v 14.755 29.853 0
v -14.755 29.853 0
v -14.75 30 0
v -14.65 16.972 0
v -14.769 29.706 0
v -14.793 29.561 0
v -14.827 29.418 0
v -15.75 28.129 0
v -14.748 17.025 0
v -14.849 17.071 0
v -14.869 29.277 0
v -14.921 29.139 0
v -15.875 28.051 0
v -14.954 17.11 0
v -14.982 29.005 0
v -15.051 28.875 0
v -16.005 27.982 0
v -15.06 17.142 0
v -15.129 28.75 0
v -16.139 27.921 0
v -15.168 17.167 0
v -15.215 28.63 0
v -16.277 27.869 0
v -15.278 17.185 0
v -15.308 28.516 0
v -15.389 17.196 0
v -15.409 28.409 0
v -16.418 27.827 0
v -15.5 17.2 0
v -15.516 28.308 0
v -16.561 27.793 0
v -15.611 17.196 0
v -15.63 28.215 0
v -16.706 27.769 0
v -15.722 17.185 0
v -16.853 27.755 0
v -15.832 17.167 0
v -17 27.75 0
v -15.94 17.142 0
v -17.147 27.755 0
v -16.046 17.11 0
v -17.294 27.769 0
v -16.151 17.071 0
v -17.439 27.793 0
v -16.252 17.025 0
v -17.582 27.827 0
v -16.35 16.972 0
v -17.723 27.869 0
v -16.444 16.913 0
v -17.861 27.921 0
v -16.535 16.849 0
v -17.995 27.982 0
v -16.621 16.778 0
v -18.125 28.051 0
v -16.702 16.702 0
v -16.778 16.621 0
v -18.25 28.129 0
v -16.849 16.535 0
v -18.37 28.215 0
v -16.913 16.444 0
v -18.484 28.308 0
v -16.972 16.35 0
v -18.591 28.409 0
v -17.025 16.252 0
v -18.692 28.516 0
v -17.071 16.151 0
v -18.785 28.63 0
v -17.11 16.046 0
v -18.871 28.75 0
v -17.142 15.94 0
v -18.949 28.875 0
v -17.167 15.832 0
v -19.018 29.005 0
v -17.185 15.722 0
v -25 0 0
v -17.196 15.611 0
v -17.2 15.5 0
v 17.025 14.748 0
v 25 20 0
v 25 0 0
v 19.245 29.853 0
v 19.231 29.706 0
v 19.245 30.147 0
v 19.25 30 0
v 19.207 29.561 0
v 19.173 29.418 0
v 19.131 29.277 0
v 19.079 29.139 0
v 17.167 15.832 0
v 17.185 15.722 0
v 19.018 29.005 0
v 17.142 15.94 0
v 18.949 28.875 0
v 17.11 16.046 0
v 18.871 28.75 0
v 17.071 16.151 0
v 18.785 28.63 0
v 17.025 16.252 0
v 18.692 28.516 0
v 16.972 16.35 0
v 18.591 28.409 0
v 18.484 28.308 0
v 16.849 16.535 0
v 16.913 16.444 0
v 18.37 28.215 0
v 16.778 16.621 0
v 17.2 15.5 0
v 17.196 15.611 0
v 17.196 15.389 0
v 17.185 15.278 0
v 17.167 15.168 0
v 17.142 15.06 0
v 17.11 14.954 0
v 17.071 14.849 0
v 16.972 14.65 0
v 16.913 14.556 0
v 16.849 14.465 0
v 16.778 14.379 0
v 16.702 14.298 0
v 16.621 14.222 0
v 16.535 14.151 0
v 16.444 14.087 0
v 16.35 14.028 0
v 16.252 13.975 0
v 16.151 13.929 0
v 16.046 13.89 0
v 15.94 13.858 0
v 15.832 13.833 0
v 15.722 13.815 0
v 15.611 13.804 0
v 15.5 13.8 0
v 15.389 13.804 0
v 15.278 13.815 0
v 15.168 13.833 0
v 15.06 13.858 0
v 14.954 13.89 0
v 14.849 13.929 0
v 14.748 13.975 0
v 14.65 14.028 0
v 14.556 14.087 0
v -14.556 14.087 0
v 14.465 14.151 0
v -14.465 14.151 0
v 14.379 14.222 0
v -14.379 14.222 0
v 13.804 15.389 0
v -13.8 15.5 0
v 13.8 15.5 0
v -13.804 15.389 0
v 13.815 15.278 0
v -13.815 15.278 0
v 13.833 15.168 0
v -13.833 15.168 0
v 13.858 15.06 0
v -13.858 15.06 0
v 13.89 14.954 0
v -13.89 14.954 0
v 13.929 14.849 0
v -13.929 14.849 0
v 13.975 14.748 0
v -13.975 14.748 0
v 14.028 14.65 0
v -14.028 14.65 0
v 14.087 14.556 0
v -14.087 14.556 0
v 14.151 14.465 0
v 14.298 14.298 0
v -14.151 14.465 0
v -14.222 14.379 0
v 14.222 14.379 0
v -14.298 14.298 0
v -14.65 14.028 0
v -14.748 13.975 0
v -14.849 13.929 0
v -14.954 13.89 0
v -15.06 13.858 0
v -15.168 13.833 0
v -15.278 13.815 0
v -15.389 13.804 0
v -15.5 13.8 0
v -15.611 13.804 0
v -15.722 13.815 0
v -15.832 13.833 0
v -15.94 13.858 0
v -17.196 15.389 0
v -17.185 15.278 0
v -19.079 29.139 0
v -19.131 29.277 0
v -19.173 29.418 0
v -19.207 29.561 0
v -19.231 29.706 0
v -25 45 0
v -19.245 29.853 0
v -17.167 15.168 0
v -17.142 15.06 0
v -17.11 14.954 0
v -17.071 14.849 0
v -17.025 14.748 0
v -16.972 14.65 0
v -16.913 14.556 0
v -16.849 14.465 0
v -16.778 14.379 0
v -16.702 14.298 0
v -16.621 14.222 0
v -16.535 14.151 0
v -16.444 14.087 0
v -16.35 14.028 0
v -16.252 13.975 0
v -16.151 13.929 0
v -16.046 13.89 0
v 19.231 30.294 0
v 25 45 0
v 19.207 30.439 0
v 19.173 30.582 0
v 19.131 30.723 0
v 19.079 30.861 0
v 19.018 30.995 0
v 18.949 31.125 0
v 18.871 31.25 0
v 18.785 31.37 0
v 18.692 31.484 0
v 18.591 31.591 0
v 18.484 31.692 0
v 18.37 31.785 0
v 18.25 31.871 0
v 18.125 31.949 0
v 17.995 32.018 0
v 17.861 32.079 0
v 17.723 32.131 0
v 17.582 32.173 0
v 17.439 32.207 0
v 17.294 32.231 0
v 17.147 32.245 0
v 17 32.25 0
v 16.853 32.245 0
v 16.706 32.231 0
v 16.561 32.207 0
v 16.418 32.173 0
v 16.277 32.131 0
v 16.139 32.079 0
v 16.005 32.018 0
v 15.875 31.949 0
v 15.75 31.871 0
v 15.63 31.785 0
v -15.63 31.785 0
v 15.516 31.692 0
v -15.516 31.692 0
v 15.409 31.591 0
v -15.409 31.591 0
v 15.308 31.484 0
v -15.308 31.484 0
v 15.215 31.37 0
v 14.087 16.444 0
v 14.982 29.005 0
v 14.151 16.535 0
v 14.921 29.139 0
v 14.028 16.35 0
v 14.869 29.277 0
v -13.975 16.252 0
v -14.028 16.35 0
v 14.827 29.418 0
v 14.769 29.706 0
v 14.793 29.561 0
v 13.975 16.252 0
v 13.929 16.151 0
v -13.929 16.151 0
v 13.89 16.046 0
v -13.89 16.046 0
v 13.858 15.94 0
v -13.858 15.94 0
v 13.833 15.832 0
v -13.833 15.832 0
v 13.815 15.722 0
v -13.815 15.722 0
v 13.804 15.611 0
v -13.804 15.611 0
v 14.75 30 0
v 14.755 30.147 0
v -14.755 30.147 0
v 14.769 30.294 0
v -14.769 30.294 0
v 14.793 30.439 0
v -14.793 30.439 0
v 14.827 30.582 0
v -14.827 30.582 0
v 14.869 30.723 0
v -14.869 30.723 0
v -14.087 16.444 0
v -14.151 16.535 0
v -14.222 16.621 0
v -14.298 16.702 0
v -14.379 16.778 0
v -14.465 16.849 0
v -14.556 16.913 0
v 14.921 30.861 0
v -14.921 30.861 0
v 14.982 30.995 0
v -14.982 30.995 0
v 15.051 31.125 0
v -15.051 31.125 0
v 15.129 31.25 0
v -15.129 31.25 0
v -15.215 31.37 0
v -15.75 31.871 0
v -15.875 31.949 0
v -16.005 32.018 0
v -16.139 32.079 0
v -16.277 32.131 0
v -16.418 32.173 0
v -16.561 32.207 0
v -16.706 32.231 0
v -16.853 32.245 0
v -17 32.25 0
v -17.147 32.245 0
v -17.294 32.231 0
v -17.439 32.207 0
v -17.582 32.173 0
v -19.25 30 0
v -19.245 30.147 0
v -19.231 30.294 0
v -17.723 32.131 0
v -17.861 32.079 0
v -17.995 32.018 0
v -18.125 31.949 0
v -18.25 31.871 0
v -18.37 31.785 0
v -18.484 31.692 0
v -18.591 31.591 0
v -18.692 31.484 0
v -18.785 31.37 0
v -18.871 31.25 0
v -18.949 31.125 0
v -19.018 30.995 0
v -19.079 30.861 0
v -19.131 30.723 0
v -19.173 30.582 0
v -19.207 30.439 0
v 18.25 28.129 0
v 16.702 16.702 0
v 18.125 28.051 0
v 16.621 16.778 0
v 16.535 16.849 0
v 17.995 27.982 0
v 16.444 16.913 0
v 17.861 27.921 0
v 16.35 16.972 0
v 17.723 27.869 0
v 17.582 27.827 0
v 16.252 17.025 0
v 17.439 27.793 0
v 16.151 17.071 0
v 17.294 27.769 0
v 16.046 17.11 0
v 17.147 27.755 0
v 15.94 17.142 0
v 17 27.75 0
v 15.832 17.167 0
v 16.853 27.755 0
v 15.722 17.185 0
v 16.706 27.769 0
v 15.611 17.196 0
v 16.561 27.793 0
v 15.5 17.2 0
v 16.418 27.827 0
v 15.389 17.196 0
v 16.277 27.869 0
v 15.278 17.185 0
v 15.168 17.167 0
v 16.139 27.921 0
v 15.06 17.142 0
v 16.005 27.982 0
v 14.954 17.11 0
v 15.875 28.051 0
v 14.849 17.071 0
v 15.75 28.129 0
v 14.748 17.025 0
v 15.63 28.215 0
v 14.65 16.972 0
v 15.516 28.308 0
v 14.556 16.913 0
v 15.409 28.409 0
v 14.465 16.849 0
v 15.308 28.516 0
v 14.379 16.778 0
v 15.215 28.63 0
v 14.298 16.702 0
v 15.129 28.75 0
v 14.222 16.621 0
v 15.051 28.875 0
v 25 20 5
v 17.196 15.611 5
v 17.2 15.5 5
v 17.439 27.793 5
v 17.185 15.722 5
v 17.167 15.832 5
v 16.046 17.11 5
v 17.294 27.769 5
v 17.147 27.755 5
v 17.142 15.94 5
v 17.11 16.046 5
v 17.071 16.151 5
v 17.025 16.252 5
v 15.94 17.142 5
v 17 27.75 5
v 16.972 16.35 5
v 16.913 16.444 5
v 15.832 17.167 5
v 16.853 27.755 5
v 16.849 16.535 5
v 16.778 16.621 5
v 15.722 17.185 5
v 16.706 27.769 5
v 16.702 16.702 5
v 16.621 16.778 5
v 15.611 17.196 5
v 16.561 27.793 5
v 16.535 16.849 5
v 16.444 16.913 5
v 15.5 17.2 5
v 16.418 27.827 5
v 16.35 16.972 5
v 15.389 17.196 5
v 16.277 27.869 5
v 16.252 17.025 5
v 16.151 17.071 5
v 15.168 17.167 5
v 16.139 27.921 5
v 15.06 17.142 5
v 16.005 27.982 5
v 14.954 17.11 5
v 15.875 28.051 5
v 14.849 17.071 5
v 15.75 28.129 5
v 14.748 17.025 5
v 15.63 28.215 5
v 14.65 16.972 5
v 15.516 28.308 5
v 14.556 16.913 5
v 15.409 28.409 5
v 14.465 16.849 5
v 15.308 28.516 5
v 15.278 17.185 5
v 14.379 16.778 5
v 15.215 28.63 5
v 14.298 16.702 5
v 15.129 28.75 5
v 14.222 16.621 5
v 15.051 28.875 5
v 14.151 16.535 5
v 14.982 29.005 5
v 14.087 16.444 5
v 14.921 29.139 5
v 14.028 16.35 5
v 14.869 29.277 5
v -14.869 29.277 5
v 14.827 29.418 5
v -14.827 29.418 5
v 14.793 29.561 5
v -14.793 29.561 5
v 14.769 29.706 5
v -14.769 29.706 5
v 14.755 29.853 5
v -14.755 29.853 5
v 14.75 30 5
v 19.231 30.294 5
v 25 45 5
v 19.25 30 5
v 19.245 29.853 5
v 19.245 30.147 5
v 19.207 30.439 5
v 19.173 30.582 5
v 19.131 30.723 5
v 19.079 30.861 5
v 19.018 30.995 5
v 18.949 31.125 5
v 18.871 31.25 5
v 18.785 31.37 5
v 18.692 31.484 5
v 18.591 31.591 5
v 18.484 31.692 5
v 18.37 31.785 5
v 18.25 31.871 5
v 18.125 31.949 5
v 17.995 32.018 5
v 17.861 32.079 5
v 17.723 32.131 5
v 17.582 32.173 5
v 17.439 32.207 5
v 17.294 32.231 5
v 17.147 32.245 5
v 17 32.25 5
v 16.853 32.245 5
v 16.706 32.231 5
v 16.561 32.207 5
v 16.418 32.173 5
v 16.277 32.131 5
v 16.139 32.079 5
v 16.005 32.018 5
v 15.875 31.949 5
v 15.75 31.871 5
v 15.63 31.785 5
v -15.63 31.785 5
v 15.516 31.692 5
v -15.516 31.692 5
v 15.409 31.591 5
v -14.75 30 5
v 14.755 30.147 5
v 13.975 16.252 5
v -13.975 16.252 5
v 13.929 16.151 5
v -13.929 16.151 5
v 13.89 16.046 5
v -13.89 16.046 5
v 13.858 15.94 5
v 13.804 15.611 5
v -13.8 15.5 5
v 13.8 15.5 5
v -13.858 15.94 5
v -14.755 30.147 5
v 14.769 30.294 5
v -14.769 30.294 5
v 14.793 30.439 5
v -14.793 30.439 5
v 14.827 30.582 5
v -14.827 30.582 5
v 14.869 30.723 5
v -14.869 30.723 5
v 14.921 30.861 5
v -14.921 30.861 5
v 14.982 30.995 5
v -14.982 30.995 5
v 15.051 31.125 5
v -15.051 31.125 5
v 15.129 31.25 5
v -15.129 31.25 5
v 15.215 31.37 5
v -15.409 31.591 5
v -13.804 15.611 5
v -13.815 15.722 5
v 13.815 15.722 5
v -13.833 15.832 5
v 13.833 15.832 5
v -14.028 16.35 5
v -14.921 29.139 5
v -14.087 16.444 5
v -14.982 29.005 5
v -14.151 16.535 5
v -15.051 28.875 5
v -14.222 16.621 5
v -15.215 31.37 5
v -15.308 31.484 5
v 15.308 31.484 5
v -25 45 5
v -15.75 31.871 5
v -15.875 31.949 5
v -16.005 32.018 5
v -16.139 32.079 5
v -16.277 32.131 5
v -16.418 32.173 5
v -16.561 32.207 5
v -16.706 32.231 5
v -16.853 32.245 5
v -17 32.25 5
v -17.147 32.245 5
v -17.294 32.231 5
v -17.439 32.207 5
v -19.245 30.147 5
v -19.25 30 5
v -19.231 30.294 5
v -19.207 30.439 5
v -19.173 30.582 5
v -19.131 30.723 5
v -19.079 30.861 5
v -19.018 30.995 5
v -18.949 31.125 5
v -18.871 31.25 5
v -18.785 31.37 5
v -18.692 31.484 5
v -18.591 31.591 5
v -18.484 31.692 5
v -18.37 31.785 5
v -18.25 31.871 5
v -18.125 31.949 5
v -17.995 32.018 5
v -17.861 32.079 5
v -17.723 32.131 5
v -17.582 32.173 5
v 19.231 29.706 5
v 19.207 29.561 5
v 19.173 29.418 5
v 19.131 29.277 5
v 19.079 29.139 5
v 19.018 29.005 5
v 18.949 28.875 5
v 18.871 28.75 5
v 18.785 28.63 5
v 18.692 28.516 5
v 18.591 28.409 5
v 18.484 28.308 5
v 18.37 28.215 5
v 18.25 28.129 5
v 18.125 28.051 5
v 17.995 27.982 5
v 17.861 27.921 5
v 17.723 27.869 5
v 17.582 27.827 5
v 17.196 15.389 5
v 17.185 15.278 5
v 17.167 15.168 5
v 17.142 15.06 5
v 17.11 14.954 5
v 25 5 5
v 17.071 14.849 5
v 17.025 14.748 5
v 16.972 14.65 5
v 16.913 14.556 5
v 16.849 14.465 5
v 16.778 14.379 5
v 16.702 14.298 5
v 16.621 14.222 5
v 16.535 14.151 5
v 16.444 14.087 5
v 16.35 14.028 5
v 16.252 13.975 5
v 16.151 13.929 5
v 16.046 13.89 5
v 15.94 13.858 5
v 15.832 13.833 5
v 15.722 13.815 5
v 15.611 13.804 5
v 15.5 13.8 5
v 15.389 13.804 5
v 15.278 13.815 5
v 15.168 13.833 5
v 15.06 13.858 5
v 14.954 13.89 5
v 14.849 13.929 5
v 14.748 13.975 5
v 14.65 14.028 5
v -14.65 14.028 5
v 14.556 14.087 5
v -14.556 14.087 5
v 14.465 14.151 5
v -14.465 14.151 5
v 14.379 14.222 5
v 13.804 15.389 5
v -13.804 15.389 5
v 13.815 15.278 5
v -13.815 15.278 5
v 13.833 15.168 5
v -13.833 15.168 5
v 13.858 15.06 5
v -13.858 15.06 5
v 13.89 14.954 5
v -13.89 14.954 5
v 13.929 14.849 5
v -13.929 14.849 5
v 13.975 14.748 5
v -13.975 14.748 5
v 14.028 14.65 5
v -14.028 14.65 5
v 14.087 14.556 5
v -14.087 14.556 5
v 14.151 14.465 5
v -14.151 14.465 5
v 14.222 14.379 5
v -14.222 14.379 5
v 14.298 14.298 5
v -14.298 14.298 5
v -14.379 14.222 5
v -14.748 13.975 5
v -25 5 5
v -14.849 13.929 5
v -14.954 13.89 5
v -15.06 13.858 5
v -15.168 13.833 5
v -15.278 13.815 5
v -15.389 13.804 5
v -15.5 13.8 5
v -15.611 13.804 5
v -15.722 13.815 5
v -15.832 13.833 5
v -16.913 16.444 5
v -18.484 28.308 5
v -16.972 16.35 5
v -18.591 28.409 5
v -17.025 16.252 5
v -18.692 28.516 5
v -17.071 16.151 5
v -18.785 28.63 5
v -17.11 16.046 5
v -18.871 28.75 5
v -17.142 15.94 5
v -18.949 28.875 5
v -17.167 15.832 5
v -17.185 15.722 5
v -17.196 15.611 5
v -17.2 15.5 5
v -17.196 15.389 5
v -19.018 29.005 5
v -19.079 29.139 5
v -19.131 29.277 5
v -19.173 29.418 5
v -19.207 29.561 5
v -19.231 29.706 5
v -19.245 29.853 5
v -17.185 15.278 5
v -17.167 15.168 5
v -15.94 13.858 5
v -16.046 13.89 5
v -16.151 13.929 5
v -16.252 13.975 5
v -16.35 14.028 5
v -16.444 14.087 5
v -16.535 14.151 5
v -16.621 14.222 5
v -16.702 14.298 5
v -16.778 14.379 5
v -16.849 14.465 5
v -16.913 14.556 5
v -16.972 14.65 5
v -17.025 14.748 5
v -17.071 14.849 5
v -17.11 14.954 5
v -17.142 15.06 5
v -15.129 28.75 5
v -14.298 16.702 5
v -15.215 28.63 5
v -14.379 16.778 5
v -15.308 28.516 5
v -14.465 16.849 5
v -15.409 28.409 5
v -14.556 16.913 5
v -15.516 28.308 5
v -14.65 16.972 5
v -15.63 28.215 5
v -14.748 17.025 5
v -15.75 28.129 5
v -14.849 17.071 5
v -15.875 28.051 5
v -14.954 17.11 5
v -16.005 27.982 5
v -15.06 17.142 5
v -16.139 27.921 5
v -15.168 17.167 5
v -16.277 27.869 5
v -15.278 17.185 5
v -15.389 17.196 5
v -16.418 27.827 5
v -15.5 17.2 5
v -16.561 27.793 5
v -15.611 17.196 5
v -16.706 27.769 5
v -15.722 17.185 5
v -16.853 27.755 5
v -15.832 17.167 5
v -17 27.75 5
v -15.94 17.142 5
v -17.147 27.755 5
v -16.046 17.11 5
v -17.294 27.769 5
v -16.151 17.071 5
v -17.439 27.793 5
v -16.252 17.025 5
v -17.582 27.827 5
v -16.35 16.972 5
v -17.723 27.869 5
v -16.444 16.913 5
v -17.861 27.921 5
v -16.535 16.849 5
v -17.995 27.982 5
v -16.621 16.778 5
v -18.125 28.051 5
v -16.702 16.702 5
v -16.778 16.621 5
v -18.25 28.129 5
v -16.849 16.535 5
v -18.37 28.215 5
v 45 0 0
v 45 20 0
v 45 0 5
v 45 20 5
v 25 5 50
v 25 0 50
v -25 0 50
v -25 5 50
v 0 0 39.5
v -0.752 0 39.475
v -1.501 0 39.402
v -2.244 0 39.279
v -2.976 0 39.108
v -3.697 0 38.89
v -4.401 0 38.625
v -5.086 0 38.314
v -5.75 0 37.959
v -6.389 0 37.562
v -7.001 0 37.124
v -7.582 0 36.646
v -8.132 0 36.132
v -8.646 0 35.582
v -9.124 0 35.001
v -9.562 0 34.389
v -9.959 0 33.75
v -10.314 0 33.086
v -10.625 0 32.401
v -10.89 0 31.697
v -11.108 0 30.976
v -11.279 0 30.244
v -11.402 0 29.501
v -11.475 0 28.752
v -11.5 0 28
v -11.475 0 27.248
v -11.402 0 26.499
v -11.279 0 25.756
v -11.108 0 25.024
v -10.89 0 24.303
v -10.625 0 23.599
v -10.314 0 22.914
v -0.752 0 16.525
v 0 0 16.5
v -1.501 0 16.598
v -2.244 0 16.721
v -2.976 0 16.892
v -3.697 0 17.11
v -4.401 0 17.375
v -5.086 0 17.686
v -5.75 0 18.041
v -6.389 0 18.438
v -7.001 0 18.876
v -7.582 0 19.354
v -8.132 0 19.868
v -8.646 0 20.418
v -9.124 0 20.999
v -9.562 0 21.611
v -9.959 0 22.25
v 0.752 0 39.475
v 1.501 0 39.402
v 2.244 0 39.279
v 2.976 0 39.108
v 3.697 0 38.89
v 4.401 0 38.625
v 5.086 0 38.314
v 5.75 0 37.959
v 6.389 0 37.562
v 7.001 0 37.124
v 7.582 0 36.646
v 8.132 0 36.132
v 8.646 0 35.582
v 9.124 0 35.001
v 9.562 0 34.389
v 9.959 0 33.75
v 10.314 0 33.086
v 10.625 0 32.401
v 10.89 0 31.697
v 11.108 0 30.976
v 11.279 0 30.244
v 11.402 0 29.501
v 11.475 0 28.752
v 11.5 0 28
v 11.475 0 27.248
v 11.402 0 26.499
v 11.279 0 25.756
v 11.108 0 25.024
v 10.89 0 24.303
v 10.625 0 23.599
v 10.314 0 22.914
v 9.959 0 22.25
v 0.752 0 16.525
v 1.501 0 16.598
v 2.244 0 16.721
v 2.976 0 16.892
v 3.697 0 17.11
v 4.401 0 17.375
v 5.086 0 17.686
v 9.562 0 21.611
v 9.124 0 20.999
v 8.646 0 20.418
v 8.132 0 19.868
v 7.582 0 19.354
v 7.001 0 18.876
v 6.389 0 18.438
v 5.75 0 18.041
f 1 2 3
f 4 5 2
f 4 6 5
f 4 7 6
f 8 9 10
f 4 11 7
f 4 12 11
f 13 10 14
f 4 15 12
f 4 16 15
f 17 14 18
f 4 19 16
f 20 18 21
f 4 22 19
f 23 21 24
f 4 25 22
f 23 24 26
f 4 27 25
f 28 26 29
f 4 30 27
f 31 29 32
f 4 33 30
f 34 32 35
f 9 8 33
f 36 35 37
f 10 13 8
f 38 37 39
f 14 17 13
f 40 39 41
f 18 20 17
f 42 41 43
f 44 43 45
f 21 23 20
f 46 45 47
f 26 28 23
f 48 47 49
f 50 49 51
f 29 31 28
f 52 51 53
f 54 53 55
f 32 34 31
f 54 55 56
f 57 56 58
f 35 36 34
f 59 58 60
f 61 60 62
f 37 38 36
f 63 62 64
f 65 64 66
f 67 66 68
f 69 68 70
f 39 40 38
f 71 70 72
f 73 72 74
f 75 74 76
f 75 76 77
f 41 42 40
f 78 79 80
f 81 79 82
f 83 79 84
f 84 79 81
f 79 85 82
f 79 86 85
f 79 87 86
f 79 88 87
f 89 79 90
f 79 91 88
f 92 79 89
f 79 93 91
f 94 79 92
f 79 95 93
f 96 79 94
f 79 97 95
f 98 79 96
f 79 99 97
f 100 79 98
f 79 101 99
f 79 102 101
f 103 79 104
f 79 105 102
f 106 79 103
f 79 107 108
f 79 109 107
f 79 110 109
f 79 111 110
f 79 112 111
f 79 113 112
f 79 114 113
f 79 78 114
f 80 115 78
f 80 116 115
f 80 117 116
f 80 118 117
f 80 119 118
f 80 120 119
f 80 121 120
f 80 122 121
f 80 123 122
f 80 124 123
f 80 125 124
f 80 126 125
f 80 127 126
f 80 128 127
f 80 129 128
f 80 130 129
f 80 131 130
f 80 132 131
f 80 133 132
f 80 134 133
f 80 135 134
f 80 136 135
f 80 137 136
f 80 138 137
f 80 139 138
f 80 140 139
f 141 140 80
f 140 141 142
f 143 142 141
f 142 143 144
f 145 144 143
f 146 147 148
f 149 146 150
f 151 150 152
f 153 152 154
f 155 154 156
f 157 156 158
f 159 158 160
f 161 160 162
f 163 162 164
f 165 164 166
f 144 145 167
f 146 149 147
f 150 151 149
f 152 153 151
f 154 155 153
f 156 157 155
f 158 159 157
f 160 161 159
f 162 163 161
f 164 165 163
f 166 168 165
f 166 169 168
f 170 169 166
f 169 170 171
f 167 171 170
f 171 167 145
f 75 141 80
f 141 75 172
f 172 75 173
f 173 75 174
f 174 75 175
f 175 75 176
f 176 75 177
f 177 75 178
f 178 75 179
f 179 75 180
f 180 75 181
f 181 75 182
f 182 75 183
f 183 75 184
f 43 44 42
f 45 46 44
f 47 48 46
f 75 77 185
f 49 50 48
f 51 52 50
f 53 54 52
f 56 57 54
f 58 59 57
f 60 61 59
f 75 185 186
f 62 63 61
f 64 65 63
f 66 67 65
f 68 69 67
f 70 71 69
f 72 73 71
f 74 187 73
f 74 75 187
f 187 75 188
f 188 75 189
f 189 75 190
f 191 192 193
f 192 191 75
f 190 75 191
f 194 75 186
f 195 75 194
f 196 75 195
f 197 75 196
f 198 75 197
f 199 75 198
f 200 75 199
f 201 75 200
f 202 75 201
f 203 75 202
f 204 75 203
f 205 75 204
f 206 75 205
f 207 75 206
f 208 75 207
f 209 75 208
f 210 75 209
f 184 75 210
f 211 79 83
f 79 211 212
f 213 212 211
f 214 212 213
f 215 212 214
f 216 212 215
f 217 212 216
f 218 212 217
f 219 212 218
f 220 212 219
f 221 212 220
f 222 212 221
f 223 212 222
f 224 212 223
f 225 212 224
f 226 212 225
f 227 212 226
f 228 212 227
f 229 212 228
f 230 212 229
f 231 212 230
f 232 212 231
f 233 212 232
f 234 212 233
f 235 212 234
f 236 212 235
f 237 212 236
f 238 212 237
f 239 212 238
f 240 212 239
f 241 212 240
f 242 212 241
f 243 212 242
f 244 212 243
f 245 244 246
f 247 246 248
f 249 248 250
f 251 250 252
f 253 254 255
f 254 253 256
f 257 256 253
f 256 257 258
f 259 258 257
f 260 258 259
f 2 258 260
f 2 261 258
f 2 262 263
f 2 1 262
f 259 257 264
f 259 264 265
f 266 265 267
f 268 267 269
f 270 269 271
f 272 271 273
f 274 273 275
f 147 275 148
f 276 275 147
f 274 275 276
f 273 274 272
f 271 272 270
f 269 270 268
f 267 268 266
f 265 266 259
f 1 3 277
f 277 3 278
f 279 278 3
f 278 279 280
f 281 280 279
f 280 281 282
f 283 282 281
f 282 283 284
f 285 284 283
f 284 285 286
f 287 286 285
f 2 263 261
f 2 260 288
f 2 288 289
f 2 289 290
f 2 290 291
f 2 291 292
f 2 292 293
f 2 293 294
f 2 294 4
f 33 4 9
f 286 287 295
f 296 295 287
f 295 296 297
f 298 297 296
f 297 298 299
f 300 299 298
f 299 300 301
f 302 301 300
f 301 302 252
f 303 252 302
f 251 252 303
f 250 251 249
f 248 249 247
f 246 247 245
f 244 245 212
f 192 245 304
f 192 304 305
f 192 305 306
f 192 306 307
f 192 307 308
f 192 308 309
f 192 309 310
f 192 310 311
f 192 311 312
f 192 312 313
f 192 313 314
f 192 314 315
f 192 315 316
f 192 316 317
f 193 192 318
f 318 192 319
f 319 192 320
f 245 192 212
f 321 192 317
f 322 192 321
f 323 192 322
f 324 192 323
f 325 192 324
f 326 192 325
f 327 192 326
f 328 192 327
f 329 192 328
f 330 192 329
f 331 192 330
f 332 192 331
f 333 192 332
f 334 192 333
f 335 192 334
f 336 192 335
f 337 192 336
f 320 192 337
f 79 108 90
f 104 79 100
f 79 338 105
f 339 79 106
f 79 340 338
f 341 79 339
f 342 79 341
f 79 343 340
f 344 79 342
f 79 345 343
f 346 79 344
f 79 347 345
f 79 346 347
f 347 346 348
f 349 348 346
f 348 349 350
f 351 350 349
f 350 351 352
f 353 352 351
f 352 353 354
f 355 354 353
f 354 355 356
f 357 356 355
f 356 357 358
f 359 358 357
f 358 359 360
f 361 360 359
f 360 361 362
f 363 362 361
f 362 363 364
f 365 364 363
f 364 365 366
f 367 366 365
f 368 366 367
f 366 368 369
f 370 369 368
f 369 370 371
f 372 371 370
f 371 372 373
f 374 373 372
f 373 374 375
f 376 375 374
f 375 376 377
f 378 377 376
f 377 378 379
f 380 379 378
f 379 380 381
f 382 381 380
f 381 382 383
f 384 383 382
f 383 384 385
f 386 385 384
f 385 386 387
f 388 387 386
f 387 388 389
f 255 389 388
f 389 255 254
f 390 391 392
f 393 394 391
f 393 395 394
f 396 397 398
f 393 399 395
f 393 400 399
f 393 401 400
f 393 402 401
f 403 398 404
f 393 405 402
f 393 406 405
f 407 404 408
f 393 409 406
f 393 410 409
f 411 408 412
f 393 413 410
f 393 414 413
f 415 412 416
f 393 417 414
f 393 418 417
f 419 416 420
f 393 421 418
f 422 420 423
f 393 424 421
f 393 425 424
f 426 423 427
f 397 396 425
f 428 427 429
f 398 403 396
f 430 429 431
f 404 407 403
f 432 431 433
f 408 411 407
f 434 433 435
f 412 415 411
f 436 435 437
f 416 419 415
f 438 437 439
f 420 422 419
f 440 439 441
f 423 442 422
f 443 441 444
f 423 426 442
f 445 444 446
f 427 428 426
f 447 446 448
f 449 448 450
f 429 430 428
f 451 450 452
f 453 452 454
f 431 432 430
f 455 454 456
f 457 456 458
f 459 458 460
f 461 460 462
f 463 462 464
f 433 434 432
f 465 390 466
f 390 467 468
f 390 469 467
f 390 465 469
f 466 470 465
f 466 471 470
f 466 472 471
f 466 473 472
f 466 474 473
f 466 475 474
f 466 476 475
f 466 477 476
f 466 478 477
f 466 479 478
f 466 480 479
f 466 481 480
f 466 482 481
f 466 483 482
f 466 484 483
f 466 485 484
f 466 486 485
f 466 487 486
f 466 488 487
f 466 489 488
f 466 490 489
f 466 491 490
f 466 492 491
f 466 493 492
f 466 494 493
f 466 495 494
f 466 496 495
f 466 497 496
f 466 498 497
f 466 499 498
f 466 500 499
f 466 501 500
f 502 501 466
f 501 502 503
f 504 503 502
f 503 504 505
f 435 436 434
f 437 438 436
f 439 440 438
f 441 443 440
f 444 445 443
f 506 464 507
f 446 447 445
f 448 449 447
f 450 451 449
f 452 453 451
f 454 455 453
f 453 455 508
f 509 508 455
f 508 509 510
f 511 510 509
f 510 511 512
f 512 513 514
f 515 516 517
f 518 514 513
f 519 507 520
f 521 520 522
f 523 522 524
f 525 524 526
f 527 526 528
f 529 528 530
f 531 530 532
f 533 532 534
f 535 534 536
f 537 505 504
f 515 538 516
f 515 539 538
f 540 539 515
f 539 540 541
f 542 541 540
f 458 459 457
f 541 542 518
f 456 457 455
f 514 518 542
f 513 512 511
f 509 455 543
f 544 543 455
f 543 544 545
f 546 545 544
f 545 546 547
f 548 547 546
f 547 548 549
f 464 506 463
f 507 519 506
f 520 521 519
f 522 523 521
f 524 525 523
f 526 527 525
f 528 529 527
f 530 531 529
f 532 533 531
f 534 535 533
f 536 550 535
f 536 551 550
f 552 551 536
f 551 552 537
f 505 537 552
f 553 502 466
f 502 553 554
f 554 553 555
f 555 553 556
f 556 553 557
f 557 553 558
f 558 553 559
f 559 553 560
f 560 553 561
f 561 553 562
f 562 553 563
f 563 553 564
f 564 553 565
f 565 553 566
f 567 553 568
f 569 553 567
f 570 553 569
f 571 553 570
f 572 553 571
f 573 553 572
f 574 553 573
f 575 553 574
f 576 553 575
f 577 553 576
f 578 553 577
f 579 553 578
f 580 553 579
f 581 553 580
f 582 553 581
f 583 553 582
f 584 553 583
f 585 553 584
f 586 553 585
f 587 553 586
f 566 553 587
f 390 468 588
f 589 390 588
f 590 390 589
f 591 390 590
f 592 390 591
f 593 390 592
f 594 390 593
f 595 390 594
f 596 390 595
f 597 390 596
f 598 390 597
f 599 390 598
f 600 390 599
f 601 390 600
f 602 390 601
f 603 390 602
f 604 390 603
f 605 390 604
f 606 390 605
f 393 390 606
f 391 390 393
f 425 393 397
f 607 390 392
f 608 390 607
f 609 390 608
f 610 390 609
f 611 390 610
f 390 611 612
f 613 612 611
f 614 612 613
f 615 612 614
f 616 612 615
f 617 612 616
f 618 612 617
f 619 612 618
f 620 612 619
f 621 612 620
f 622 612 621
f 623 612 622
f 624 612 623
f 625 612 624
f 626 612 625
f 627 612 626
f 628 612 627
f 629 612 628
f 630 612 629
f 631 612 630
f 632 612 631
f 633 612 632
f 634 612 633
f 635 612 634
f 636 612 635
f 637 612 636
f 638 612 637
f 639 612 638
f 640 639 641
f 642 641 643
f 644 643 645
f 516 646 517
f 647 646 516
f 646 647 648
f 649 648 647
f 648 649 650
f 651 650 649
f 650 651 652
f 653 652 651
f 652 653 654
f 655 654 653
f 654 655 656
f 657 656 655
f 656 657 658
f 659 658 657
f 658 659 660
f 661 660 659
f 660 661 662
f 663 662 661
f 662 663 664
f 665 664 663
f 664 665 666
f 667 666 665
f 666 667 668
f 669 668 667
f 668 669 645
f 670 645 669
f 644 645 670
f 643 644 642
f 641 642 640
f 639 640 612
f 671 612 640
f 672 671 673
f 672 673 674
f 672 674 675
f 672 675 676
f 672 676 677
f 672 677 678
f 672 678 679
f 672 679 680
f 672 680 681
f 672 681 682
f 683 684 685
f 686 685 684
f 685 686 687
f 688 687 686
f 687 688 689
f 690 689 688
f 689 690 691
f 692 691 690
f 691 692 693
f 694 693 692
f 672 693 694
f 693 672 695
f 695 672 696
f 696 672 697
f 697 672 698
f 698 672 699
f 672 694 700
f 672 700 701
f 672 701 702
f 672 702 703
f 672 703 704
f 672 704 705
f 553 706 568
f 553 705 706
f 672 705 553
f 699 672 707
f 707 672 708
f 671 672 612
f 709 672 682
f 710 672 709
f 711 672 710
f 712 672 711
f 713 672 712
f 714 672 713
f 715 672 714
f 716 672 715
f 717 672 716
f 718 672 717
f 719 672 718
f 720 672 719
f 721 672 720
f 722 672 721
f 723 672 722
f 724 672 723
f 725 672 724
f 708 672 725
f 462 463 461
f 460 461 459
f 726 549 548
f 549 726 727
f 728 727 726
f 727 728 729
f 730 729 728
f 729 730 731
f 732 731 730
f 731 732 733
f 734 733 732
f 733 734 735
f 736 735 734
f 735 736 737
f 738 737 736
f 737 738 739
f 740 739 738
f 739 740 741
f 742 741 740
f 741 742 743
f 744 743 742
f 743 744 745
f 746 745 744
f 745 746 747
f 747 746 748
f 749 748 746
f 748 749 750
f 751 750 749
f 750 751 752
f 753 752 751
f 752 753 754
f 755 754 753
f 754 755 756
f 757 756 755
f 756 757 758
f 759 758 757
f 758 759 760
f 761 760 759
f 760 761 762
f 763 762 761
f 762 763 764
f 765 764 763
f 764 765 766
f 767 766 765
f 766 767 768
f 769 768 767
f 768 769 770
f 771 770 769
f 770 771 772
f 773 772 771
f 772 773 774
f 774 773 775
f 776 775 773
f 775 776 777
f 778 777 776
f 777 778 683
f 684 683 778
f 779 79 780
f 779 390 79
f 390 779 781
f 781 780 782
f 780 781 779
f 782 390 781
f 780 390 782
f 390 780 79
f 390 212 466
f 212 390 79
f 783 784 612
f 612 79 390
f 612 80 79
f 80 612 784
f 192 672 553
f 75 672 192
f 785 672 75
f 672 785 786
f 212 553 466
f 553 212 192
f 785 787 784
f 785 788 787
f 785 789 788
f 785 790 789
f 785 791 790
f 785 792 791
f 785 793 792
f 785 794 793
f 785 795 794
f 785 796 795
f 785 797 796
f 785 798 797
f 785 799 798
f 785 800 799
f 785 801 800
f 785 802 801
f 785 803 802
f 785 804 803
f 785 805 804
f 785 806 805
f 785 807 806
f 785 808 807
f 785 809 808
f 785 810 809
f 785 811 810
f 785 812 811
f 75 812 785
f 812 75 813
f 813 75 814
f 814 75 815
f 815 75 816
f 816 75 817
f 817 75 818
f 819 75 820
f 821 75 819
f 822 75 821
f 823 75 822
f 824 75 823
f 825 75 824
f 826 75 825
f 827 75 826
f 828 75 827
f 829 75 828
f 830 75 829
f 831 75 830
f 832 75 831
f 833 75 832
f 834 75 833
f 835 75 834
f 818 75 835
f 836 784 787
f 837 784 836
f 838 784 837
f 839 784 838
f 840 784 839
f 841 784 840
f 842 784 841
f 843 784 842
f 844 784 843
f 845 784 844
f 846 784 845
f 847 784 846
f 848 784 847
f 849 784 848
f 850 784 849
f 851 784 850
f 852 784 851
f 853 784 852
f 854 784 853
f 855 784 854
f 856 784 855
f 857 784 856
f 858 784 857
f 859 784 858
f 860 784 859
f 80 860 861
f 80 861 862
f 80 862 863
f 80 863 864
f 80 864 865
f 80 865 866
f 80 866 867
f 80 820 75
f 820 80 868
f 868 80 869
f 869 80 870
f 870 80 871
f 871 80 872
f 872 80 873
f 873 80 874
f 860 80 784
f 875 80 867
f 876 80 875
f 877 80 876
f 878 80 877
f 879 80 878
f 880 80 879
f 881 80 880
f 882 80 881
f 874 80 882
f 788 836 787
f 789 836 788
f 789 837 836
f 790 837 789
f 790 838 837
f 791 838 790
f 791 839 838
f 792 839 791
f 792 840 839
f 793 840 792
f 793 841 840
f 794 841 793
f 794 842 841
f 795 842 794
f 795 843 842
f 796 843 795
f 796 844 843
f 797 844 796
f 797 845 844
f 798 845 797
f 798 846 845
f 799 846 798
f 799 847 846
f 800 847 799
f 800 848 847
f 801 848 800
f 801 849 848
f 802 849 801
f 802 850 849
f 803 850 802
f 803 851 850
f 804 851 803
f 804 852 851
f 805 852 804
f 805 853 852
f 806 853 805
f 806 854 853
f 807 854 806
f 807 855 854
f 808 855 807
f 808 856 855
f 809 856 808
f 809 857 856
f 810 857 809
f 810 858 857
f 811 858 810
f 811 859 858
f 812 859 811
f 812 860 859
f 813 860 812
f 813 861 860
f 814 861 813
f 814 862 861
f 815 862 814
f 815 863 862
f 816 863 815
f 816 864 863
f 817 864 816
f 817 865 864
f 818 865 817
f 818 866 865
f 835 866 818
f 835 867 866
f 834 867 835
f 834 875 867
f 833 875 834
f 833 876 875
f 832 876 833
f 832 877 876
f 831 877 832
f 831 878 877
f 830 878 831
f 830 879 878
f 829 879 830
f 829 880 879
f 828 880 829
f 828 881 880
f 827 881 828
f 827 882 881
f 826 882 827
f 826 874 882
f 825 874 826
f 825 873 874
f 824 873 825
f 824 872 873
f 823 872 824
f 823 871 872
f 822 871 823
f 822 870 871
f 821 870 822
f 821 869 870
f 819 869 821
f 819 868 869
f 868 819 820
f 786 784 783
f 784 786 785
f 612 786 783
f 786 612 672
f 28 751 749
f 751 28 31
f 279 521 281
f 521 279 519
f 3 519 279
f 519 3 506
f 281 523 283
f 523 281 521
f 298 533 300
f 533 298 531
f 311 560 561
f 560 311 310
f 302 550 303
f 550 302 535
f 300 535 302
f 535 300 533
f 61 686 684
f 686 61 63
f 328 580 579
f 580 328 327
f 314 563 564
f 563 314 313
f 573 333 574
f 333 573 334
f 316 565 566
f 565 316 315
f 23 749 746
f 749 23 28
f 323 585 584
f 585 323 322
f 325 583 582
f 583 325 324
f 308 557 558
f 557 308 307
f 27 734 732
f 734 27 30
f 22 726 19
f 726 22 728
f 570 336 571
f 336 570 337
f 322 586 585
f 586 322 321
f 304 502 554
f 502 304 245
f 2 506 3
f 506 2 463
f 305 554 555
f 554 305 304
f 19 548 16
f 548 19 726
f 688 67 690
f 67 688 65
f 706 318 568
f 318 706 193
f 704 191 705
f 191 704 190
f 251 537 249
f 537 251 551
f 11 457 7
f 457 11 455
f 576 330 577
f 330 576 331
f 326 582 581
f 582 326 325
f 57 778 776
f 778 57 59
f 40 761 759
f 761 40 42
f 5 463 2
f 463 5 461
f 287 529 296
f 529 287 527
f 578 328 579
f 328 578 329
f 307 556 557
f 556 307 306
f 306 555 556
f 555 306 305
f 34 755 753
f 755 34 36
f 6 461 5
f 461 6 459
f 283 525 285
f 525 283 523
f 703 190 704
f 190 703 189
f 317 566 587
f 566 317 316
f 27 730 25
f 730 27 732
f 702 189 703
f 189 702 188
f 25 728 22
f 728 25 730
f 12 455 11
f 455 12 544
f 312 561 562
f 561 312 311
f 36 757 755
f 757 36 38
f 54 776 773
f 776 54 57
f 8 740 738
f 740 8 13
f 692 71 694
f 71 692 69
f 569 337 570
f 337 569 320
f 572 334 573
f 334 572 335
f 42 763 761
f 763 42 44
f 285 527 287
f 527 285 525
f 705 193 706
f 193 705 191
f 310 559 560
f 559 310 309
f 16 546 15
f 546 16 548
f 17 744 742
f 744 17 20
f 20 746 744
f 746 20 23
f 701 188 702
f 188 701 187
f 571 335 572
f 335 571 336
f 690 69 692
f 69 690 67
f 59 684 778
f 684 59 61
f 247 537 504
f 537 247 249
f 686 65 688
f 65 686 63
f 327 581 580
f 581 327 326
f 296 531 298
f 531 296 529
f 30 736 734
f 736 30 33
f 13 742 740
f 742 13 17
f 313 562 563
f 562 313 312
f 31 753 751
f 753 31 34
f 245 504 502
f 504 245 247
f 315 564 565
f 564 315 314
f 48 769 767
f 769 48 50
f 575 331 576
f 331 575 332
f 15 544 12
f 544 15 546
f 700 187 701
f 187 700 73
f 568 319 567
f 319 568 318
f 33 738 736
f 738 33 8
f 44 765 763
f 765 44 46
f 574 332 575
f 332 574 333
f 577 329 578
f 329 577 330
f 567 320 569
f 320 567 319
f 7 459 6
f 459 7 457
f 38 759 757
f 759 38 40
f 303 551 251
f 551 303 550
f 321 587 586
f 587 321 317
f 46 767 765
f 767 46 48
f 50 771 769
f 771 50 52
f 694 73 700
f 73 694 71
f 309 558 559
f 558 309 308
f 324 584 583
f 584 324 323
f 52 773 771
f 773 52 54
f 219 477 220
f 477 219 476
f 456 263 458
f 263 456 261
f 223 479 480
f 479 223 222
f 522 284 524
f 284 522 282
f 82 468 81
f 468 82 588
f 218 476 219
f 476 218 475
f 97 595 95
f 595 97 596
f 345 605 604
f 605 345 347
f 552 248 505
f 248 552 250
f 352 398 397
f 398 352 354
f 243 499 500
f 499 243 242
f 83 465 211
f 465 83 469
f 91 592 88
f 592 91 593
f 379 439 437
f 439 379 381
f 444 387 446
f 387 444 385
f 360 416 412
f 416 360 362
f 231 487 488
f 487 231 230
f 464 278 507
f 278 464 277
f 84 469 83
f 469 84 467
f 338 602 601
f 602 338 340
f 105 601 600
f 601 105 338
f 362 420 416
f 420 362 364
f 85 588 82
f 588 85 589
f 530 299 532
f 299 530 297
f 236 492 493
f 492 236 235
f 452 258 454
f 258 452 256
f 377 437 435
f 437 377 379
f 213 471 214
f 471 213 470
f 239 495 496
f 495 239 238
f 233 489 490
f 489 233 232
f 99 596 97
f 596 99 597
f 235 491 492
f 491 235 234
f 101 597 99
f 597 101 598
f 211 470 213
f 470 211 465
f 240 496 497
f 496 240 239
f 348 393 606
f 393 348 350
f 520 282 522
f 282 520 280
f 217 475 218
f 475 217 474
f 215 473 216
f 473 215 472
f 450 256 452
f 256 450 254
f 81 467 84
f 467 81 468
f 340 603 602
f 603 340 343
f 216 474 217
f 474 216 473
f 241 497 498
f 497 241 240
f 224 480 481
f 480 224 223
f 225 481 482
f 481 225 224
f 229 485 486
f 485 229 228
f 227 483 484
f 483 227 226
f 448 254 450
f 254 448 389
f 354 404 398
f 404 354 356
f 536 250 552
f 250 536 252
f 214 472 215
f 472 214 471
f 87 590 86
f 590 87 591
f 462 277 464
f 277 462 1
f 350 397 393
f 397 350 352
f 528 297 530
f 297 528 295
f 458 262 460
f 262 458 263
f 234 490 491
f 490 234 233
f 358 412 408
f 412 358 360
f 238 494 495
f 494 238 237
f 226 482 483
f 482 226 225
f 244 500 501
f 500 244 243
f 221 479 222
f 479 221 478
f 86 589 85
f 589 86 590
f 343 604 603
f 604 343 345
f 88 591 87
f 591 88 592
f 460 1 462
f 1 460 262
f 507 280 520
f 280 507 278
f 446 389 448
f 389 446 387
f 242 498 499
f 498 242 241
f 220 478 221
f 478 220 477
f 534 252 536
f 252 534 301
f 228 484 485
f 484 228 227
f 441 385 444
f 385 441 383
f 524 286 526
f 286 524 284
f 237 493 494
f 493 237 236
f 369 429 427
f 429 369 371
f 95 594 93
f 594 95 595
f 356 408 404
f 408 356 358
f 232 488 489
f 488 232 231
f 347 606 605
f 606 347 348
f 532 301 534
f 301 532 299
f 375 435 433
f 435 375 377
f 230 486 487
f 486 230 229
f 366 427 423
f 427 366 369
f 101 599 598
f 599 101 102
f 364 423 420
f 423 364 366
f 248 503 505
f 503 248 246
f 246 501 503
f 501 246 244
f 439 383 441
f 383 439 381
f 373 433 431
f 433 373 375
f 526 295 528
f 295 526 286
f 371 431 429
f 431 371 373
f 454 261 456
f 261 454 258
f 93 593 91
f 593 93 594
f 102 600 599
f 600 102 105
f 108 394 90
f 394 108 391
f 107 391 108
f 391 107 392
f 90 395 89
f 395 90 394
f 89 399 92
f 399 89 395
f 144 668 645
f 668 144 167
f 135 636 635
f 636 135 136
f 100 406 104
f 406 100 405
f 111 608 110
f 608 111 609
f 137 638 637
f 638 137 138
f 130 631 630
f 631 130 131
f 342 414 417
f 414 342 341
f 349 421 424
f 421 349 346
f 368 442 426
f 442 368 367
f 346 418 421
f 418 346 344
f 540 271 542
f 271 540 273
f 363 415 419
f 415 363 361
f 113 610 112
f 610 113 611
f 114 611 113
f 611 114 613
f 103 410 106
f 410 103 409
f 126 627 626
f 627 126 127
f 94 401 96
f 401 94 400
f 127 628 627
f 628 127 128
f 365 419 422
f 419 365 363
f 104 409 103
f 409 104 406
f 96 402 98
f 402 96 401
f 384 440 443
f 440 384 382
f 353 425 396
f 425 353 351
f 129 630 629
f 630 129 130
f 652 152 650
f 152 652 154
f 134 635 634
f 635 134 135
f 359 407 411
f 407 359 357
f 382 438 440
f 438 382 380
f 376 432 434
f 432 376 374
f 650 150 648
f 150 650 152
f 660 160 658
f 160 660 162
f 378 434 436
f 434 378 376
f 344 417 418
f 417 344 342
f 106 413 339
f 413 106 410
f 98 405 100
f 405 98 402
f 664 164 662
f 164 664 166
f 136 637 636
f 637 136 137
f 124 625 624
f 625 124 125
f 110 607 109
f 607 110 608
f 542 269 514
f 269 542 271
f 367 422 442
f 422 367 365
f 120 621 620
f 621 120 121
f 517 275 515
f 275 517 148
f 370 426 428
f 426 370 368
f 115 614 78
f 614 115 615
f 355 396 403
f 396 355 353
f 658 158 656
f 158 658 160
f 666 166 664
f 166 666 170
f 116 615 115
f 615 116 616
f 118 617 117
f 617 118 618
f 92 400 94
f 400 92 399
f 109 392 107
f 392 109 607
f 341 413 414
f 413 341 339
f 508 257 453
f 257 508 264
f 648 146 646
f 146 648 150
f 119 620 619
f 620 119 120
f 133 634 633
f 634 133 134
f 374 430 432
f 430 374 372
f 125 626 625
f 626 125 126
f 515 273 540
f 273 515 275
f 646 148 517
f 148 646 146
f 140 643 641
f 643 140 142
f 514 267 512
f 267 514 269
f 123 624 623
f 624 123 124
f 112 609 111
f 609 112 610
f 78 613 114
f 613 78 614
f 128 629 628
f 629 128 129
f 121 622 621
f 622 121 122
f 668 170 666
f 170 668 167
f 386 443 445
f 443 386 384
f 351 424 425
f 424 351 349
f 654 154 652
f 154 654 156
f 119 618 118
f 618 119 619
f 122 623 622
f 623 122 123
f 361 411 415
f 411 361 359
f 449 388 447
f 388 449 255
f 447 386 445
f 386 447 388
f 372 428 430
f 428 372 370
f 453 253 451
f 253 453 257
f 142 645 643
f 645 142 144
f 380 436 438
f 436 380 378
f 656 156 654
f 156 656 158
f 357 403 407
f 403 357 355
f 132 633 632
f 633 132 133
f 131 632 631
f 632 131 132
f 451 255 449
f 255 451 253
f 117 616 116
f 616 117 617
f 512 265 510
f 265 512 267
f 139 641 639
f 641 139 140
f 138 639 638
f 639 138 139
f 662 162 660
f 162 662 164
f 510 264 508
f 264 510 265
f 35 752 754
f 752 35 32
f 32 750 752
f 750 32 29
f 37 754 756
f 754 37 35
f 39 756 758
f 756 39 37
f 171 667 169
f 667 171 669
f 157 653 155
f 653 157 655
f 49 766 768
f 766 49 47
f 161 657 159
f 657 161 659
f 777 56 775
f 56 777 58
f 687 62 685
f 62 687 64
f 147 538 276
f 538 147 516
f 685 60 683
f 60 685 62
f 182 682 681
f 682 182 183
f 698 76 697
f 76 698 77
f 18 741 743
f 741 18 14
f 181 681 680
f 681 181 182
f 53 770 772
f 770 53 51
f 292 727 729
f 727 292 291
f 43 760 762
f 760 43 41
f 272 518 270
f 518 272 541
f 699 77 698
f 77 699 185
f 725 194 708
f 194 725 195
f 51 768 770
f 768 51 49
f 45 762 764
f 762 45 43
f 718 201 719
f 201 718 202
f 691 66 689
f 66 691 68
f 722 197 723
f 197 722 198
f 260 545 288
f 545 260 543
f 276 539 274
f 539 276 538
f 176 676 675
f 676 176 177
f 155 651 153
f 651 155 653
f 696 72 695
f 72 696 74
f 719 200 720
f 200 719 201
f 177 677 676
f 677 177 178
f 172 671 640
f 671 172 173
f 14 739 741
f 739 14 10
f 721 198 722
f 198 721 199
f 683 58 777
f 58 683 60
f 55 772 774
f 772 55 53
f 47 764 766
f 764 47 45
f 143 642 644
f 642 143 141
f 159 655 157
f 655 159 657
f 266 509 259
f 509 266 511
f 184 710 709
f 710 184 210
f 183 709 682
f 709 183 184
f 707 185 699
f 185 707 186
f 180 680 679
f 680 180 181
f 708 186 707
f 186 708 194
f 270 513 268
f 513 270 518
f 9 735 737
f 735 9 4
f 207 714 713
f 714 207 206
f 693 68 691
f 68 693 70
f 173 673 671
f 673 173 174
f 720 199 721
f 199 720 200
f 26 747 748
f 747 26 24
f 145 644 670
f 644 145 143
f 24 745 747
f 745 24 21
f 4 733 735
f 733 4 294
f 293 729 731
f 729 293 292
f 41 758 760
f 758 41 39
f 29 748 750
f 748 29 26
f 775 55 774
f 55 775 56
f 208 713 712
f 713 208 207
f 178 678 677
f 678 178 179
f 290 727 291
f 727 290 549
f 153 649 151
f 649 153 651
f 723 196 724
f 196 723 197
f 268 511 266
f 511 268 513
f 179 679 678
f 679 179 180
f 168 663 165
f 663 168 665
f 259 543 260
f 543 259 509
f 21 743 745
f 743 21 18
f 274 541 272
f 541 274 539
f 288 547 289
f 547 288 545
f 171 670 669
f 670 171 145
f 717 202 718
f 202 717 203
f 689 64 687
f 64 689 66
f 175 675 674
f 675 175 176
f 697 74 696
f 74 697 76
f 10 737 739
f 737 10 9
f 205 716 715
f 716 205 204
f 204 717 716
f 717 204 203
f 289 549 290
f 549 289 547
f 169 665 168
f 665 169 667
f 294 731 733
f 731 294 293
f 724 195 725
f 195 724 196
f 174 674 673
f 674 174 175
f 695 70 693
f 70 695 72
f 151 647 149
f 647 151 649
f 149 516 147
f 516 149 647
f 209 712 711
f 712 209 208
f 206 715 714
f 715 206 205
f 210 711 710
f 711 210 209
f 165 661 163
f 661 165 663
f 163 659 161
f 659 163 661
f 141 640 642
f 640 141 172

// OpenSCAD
// L-shaped mounting bracket for NEMA 17 stepper motor
// Print orientation: base plate on bed, vertical plate builds upward (+Z)

// ---------------- Parameters ----------------
plate_w      = 50;    // base plate length (X)
plate_h      = 45;    // base plate width (Y)
plate_t      = 5;     // base plate thickness (Z)

hole_x       = 17;    // M4 through-hole X offset (±)
hole_y       = 30;    // M4 through-hole Y position
hole_d       = 4.5;   // M4 through-hole diameter

plate_v_w    = 50;    // vertical motor plate length (X)
plate_v_h    = 5;     // vertical motor plate width (Y)
plate_v_z    = 50;    // vertical motor plate height (Z)

boss_d       = 23;    // motor centring boss hole diameter
boss_x       = 0;     // boss hole X centre
boss_z       = 28;    // boss hole Z centre

screw_d      = 3.4;   // M3 screw hole diameter
screw_pitch  = 31;    // square pattern side length

gusset_t     = 5;     // gusset thickness (X)
gusset_leg   = 20;    // right-triangle leg length (Y and Z)
gusset_x     = 25;    // gusset attachment X position (25 to 20, 20 to 25)

eps          = 0.5;   // cutter overshoot past faces

$fn = 96;

// ---------------- Model ----------------
difference() {
    union() {
        // Base plate
        translate([-plate_w/2, 0, 0])
            cube([plate_w, plate_h, plate_t]);

        // Vertical motor plate
        translate([-plate_v_w/2, 0, 0])
            cube([plate_v_w, plate_v_h, plate_v_z]);

        // Gussets (right and left)
        for (sx = [-1, 1])
            translate([sx > 0 ? gusset_x : -gusset_x, 0, 0])
                linear_extrude(height = gusset_t)
                    polygon(points = [
                        [0, gusset_leg],
                        [gusset_leg, gusset_leg],
                        [gusset_leg, 0]
                    ]);
    }

    // M4 through-holes in base plate
    for (x = [-hole_x, hole_x])
        translate([x, hole_y, -eps])
            cylinder(d = hole_d, h = plate_t + 2*eps);

    // Motor boss hole through vertical plate (along Y)
    translate([boss_x, 0, boss_z])
        rotate([90, 0, 0])
            cylinder(d = boss_d, h = plate_v_h + 2*eps);

    // M3 screw holes on square pattern around boss hole
    for (a = [0, 90, 180, 270])
        rotate([0, 0, a])
            translate([screw_pitch/2, screw_pitch/2, 0])
                cylinder(d = screw_d, h = plate_v_z + 2*eps);
}
